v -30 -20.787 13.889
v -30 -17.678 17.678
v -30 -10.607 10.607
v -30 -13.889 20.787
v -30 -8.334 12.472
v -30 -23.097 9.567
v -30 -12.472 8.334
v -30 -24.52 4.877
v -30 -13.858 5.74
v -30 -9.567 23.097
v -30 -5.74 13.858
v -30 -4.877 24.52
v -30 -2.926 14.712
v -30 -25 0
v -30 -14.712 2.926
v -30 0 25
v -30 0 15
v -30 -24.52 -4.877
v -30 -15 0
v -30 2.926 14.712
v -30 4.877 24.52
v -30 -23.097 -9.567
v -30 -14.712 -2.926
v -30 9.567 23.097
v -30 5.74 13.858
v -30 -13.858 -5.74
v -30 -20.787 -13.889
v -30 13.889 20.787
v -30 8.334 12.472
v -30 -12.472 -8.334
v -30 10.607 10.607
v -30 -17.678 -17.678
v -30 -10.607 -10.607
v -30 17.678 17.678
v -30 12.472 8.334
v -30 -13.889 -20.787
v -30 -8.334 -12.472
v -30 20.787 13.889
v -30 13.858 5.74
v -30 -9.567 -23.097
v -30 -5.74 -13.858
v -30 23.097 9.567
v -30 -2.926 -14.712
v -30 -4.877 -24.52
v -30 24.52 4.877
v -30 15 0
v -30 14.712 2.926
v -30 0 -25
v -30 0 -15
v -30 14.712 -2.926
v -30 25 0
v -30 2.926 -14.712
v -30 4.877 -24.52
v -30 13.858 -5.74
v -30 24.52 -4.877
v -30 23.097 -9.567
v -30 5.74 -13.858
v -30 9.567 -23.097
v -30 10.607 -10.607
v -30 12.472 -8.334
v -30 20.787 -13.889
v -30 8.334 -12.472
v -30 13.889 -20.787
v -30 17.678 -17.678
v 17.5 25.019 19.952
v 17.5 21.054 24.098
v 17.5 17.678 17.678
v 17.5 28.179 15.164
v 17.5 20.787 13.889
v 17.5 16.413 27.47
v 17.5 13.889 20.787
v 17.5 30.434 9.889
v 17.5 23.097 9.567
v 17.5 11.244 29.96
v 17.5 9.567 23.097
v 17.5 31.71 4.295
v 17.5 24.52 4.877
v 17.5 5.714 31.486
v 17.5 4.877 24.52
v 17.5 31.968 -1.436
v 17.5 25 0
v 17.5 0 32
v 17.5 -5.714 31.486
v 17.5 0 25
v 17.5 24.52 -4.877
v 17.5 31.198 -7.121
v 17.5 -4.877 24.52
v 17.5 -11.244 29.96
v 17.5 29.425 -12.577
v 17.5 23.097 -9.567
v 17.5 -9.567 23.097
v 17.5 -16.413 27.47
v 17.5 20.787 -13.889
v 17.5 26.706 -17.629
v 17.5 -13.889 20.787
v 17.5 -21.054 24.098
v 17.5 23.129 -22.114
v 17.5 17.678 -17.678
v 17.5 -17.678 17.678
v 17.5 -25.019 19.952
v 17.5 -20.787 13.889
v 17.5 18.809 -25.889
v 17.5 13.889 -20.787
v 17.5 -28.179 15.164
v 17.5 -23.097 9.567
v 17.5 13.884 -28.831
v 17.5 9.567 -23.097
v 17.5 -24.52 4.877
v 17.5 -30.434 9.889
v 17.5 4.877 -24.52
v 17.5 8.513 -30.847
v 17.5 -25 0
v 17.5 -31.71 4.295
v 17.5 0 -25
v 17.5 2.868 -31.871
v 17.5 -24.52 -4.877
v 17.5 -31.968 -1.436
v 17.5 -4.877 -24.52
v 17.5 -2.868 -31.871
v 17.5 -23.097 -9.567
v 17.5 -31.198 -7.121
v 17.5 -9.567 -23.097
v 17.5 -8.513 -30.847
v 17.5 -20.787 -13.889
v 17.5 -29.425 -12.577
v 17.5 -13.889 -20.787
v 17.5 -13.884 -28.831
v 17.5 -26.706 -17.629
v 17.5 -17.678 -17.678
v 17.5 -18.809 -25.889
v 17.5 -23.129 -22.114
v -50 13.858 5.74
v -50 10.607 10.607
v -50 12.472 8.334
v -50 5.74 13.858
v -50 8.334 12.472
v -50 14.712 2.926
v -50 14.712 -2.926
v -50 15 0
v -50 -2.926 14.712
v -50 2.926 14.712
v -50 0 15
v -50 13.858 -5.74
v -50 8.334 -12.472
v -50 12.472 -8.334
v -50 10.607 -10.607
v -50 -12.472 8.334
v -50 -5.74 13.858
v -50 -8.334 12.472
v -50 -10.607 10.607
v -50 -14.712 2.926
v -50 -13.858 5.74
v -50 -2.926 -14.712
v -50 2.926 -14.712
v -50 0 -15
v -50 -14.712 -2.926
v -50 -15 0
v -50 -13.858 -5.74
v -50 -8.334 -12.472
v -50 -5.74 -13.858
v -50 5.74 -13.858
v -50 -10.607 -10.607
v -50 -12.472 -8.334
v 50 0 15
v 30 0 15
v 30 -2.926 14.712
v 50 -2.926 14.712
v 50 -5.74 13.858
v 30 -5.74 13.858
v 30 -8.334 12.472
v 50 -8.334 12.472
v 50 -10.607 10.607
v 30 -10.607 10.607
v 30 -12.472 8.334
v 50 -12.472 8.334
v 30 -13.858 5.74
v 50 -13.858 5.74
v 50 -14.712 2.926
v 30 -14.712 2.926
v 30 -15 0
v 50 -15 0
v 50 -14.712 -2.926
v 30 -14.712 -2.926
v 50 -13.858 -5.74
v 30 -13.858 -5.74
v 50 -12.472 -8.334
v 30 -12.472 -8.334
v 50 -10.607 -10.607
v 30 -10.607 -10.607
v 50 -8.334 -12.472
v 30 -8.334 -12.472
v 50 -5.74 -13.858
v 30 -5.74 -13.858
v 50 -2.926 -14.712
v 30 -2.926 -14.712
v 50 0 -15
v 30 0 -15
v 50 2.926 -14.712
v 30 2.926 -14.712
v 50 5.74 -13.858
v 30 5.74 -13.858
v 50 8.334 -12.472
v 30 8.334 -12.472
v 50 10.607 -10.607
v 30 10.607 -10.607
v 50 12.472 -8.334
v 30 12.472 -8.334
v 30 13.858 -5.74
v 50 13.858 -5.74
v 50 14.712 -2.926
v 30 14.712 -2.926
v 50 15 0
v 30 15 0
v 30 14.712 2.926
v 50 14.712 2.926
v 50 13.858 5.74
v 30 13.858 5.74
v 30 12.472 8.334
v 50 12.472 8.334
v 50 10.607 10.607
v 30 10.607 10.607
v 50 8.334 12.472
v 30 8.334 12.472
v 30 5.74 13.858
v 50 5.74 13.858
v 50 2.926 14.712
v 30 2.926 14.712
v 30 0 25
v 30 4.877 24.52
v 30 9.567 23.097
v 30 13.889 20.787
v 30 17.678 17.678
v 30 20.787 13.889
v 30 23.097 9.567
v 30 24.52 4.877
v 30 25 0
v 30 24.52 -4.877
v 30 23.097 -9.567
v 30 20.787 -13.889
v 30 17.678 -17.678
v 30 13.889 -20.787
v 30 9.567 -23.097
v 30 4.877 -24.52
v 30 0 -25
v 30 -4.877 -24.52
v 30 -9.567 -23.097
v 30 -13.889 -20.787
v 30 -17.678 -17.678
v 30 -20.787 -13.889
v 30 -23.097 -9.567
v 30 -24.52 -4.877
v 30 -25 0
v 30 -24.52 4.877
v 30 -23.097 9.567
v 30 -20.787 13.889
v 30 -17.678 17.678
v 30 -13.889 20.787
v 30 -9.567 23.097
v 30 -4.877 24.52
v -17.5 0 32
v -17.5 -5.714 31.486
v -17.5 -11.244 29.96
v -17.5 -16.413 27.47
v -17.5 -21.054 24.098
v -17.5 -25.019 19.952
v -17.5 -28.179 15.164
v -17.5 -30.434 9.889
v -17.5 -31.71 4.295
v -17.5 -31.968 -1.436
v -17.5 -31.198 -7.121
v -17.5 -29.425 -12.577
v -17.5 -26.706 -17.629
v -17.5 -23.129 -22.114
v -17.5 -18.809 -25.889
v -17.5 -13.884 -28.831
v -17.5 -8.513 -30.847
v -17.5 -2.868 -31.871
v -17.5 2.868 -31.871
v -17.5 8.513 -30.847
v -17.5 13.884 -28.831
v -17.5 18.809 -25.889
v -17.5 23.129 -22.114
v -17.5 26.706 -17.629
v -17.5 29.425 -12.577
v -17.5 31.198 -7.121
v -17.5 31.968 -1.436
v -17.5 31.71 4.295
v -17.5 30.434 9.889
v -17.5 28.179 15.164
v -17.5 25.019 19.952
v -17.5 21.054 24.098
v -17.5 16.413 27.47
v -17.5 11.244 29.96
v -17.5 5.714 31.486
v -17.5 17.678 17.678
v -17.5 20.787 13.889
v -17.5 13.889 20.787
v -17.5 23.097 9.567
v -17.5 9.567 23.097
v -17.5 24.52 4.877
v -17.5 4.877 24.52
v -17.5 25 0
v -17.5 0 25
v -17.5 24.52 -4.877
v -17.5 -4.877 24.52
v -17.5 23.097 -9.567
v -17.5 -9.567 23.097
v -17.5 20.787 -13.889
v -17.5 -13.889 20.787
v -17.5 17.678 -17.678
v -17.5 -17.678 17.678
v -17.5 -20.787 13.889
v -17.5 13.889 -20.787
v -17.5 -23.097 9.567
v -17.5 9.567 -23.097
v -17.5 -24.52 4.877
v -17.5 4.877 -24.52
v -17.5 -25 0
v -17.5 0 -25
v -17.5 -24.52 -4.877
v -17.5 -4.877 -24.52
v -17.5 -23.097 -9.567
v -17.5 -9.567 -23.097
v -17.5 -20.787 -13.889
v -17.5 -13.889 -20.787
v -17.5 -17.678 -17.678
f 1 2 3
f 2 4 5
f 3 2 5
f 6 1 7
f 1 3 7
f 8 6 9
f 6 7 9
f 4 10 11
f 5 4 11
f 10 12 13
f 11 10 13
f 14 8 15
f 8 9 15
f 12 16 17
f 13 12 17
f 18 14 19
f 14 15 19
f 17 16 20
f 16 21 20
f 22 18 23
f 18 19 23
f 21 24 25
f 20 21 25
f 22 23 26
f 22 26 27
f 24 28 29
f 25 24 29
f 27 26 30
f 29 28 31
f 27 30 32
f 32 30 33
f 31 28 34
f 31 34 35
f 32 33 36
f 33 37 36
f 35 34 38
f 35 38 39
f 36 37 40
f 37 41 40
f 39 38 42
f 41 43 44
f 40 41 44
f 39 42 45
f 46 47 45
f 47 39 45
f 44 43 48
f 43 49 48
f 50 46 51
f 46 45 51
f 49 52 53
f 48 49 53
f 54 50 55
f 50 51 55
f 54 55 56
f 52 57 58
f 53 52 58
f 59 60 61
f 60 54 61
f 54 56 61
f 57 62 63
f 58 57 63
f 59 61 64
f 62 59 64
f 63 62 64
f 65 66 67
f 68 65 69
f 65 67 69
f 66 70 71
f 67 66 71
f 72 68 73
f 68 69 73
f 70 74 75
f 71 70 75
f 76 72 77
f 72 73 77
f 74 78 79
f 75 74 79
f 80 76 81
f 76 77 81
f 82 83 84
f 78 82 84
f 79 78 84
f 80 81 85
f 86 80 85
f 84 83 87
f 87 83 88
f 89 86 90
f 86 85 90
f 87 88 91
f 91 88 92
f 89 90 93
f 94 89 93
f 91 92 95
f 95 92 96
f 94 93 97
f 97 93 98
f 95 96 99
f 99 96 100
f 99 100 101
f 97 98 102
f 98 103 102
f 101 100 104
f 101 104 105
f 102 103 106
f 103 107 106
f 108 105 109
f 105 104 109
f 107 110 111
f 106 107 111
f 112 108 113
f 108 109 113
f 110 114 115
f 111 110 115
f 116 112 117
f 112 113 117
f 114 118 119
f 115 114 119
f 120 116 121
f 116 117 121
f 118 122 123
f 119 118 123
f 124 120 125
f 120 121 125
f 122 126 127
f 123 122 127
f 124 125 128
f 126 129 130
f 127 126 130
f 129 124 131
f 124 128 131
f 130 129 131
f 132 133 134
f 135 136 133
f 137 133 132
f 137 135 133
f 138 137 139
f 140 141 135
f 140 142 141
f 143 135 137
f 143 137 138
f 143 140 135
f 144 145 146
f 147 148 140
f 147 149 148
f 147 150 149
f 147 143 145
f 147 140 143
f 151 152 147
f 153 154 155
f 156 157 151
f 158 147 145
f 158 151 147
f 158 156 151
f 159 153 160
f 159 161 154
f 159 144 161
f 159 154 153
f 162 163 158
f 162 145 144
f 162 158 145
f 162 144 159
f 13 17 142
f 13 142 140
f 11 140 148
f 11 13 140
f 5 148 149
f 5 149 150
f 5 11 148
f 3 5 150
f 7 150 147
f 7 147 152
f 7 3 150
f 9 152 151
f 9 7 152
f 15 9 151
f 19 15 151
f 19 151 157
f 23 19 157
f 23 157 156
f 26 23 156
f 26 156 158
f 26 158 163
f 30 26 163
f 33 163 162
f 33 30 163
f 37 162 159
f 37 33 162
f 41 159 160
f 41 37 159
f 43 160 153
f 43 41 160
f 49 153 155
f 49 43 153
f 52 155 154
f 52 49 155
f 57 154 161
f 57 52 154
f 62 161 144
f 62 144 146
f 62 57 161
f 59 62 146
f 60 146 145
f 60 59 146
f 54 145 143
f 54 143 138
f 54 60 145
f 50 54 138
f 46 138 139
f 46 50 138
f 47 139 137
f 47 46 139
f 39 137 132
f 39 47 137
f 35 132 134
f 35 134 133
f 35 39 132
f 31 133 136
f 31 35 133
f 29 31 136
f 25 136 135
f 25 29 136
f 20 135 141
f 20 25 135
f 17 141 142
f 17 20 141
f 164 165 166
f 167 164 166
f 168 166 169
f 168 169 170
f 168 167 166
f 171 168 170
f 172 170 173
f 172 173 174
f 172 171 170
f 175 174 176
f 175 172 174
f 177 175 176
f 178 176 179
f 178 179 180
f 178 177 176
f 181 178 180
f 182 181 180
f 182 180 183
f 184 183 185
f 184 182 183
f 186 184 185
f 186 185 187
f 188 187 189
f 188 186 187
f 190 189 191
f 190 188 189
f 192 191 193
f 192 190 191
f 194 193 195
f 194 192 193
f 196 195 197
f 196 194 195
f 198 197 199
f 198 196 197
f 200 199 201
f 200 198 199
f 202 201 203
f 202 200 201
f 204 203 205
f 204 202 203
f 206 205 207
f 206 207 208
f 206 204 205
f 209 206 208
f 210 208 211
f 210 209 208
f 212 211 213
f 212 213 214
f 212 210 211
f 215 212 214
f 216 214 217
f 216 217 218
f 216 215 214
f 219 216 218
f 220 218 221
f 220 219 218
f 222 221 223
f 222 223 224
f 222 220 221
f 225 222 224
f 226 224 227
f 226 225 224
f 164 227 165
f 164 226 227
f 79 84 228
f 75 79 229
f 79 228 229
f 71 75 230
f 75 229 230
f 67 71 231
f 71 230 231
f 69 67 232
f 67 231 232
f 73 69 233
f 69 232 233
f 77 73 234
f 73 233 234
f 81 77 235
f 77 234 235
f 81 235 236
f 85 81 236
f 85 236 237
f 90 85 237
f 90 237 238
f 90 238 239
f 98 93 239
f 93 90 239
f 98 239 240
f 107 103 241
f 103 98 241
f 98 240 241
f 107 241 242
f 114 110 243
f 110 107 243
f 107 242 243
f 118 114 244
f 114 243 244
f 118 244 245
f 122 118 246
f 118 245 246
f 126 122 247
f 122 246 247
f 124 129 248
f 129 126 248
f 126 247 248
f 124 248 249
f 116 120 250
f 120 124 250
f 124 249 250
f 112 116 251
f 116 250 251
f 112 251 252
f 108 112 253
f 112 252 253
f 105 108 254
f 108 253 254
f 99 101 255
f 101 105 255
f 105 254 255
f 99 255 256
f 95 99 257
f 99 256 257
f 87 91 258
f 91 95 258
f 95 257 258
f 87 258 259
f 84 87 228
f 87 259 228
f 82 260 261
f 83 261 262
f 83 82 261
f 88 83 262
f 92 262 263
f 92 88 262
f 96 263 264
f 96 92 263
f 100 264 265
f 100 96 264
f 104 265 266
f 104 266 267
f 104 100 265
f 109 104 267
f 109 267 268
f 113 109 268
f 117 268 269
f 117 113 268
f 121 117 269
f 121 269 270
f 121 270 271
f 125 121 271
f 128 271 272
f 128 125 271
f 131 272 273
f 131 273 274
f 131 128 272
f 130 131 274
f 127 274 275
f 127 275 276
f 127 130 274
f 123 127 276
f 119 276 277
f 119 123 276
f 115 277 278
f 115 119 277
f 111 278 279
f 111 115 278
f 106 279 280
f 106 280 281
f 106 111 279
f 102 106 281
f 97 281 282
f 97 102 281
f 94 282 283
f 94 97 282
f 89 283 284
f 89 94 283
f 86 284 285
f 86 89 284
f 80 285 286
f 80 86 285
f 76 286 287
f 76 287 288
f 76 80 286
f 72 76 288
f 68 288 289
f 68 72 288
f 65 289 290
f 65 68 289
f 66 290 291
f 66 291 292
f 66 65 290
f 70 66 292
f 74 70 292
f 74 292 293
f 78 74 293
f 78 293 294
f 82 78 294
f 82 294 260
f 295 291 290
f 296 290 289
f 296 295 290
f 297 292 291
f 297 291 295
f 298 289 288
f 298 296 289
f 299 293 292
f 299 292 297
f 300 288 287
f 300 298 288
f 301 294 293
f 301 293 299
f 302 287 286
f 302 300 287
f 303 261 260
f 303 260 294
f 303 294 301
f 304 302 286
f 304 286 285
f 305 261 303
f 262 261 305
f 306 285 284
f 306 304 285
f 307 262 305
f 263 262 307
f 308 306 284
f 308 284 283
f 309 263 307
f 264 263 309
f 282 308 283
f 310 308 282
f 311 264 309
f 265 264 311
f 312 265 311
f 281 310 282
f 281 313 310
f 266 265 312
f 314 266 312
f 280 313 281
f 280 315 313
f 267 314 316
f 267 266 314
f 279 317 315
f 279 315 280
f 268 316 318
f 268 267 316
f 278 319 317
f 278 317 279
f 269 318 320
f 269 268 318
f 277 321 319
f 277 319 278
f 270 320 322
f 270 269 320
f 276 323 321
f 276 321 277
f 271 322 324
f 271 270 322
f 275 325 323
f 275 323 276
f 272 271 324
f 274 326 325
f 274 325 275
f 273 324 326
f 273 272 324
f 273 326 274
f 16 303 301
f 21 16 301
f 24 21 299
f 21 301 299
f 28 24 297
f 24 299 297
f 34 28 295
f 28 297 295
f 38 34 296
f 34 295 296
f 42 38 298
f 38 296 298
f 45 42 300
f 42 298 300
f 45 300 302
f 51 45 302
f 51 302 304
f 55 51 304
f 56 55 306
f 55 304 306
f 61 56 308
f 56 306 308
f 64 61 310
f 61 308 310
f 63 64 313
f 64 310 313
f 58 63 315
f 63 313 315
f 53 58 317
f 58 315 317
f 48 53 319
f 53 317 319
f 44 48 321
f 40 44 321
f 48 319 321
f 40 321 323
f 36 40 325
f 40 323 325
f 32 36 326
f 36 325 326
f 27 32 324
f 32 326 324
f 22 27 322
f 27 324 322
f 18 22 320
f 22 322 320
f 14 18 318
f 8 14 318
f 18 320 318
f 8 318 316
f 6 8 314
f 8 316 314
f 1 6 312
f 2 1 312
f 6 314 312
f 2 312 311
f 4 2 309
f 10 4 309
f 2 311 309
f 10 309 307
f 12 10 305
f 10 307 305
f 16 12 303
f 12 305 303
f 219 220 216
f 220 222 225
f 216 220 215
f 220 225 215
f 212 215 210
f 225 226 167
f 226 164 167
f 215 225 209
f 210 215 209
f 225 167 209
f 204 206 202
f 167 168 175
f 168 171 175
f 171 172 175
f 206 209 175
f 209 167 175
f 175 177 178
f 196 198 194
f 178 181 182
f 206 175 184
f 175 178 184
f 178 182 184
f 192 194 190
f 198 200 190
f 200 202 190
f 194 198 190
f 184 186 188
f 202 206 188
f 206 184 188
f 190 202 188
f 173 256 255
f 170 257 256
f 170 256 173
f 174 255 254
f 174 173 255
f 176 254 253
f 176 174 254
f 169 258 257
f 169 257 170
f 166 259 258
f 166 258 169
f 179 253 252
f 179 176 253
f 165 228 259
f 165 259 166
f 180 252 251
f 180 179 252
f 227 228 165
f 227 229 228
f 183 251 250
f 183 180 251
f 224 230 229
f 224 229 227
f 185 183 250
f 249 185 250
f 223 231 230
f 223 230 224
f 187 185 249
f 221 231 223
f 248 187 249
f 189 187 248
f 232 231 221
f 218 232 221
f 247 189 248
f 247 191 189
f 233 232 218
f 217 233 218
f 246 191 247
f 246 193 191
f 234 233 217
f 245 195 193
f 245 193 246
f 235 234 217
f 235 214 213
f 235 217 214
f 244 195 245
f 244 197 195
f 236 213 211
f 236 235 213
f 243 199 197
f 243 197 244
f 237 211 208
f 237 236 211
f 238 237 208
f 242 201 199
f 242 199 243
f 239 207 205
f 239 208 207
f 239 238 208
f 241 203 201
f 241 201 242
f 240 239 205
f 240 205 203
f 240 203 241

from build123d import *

# Parameters (mm, degrees)
F0_W = 100
F0_H = 15
F2_W = 60
F2_H = 25
F4_W = 35
F4_H = 32


with BuildPart() as f1:
    # F0 (on Front) → F1 (revolve)
    with BuildSketch(Plane.XZ):
        with Locations((0, 7.5)):
            Rectangle(F0_W, F0_H)
    revolve(axis=Axis((-0.244819, 0, 0), (1, 0, 0)))

    # F2 (on Front) → F3 (revolve)
    with BuildSketch(Plane.XZ):
        with Locations((0, 12.5)):
            Rectangle(F2_W, F2_H)
    revolve(axis=Axis((16.772865, 0, 0), (-1, 0, 0)))

    # F4 (on Front) → F5 (revolve)
    with BuildSketch(Plane.XZ):
        with Locations((0, 16)):
            Rectangle(F4_W, F4_H)
    revolve(axis=Axis((8.252203, 0, 0), (1, 0, 0)))


solid = f1.part
